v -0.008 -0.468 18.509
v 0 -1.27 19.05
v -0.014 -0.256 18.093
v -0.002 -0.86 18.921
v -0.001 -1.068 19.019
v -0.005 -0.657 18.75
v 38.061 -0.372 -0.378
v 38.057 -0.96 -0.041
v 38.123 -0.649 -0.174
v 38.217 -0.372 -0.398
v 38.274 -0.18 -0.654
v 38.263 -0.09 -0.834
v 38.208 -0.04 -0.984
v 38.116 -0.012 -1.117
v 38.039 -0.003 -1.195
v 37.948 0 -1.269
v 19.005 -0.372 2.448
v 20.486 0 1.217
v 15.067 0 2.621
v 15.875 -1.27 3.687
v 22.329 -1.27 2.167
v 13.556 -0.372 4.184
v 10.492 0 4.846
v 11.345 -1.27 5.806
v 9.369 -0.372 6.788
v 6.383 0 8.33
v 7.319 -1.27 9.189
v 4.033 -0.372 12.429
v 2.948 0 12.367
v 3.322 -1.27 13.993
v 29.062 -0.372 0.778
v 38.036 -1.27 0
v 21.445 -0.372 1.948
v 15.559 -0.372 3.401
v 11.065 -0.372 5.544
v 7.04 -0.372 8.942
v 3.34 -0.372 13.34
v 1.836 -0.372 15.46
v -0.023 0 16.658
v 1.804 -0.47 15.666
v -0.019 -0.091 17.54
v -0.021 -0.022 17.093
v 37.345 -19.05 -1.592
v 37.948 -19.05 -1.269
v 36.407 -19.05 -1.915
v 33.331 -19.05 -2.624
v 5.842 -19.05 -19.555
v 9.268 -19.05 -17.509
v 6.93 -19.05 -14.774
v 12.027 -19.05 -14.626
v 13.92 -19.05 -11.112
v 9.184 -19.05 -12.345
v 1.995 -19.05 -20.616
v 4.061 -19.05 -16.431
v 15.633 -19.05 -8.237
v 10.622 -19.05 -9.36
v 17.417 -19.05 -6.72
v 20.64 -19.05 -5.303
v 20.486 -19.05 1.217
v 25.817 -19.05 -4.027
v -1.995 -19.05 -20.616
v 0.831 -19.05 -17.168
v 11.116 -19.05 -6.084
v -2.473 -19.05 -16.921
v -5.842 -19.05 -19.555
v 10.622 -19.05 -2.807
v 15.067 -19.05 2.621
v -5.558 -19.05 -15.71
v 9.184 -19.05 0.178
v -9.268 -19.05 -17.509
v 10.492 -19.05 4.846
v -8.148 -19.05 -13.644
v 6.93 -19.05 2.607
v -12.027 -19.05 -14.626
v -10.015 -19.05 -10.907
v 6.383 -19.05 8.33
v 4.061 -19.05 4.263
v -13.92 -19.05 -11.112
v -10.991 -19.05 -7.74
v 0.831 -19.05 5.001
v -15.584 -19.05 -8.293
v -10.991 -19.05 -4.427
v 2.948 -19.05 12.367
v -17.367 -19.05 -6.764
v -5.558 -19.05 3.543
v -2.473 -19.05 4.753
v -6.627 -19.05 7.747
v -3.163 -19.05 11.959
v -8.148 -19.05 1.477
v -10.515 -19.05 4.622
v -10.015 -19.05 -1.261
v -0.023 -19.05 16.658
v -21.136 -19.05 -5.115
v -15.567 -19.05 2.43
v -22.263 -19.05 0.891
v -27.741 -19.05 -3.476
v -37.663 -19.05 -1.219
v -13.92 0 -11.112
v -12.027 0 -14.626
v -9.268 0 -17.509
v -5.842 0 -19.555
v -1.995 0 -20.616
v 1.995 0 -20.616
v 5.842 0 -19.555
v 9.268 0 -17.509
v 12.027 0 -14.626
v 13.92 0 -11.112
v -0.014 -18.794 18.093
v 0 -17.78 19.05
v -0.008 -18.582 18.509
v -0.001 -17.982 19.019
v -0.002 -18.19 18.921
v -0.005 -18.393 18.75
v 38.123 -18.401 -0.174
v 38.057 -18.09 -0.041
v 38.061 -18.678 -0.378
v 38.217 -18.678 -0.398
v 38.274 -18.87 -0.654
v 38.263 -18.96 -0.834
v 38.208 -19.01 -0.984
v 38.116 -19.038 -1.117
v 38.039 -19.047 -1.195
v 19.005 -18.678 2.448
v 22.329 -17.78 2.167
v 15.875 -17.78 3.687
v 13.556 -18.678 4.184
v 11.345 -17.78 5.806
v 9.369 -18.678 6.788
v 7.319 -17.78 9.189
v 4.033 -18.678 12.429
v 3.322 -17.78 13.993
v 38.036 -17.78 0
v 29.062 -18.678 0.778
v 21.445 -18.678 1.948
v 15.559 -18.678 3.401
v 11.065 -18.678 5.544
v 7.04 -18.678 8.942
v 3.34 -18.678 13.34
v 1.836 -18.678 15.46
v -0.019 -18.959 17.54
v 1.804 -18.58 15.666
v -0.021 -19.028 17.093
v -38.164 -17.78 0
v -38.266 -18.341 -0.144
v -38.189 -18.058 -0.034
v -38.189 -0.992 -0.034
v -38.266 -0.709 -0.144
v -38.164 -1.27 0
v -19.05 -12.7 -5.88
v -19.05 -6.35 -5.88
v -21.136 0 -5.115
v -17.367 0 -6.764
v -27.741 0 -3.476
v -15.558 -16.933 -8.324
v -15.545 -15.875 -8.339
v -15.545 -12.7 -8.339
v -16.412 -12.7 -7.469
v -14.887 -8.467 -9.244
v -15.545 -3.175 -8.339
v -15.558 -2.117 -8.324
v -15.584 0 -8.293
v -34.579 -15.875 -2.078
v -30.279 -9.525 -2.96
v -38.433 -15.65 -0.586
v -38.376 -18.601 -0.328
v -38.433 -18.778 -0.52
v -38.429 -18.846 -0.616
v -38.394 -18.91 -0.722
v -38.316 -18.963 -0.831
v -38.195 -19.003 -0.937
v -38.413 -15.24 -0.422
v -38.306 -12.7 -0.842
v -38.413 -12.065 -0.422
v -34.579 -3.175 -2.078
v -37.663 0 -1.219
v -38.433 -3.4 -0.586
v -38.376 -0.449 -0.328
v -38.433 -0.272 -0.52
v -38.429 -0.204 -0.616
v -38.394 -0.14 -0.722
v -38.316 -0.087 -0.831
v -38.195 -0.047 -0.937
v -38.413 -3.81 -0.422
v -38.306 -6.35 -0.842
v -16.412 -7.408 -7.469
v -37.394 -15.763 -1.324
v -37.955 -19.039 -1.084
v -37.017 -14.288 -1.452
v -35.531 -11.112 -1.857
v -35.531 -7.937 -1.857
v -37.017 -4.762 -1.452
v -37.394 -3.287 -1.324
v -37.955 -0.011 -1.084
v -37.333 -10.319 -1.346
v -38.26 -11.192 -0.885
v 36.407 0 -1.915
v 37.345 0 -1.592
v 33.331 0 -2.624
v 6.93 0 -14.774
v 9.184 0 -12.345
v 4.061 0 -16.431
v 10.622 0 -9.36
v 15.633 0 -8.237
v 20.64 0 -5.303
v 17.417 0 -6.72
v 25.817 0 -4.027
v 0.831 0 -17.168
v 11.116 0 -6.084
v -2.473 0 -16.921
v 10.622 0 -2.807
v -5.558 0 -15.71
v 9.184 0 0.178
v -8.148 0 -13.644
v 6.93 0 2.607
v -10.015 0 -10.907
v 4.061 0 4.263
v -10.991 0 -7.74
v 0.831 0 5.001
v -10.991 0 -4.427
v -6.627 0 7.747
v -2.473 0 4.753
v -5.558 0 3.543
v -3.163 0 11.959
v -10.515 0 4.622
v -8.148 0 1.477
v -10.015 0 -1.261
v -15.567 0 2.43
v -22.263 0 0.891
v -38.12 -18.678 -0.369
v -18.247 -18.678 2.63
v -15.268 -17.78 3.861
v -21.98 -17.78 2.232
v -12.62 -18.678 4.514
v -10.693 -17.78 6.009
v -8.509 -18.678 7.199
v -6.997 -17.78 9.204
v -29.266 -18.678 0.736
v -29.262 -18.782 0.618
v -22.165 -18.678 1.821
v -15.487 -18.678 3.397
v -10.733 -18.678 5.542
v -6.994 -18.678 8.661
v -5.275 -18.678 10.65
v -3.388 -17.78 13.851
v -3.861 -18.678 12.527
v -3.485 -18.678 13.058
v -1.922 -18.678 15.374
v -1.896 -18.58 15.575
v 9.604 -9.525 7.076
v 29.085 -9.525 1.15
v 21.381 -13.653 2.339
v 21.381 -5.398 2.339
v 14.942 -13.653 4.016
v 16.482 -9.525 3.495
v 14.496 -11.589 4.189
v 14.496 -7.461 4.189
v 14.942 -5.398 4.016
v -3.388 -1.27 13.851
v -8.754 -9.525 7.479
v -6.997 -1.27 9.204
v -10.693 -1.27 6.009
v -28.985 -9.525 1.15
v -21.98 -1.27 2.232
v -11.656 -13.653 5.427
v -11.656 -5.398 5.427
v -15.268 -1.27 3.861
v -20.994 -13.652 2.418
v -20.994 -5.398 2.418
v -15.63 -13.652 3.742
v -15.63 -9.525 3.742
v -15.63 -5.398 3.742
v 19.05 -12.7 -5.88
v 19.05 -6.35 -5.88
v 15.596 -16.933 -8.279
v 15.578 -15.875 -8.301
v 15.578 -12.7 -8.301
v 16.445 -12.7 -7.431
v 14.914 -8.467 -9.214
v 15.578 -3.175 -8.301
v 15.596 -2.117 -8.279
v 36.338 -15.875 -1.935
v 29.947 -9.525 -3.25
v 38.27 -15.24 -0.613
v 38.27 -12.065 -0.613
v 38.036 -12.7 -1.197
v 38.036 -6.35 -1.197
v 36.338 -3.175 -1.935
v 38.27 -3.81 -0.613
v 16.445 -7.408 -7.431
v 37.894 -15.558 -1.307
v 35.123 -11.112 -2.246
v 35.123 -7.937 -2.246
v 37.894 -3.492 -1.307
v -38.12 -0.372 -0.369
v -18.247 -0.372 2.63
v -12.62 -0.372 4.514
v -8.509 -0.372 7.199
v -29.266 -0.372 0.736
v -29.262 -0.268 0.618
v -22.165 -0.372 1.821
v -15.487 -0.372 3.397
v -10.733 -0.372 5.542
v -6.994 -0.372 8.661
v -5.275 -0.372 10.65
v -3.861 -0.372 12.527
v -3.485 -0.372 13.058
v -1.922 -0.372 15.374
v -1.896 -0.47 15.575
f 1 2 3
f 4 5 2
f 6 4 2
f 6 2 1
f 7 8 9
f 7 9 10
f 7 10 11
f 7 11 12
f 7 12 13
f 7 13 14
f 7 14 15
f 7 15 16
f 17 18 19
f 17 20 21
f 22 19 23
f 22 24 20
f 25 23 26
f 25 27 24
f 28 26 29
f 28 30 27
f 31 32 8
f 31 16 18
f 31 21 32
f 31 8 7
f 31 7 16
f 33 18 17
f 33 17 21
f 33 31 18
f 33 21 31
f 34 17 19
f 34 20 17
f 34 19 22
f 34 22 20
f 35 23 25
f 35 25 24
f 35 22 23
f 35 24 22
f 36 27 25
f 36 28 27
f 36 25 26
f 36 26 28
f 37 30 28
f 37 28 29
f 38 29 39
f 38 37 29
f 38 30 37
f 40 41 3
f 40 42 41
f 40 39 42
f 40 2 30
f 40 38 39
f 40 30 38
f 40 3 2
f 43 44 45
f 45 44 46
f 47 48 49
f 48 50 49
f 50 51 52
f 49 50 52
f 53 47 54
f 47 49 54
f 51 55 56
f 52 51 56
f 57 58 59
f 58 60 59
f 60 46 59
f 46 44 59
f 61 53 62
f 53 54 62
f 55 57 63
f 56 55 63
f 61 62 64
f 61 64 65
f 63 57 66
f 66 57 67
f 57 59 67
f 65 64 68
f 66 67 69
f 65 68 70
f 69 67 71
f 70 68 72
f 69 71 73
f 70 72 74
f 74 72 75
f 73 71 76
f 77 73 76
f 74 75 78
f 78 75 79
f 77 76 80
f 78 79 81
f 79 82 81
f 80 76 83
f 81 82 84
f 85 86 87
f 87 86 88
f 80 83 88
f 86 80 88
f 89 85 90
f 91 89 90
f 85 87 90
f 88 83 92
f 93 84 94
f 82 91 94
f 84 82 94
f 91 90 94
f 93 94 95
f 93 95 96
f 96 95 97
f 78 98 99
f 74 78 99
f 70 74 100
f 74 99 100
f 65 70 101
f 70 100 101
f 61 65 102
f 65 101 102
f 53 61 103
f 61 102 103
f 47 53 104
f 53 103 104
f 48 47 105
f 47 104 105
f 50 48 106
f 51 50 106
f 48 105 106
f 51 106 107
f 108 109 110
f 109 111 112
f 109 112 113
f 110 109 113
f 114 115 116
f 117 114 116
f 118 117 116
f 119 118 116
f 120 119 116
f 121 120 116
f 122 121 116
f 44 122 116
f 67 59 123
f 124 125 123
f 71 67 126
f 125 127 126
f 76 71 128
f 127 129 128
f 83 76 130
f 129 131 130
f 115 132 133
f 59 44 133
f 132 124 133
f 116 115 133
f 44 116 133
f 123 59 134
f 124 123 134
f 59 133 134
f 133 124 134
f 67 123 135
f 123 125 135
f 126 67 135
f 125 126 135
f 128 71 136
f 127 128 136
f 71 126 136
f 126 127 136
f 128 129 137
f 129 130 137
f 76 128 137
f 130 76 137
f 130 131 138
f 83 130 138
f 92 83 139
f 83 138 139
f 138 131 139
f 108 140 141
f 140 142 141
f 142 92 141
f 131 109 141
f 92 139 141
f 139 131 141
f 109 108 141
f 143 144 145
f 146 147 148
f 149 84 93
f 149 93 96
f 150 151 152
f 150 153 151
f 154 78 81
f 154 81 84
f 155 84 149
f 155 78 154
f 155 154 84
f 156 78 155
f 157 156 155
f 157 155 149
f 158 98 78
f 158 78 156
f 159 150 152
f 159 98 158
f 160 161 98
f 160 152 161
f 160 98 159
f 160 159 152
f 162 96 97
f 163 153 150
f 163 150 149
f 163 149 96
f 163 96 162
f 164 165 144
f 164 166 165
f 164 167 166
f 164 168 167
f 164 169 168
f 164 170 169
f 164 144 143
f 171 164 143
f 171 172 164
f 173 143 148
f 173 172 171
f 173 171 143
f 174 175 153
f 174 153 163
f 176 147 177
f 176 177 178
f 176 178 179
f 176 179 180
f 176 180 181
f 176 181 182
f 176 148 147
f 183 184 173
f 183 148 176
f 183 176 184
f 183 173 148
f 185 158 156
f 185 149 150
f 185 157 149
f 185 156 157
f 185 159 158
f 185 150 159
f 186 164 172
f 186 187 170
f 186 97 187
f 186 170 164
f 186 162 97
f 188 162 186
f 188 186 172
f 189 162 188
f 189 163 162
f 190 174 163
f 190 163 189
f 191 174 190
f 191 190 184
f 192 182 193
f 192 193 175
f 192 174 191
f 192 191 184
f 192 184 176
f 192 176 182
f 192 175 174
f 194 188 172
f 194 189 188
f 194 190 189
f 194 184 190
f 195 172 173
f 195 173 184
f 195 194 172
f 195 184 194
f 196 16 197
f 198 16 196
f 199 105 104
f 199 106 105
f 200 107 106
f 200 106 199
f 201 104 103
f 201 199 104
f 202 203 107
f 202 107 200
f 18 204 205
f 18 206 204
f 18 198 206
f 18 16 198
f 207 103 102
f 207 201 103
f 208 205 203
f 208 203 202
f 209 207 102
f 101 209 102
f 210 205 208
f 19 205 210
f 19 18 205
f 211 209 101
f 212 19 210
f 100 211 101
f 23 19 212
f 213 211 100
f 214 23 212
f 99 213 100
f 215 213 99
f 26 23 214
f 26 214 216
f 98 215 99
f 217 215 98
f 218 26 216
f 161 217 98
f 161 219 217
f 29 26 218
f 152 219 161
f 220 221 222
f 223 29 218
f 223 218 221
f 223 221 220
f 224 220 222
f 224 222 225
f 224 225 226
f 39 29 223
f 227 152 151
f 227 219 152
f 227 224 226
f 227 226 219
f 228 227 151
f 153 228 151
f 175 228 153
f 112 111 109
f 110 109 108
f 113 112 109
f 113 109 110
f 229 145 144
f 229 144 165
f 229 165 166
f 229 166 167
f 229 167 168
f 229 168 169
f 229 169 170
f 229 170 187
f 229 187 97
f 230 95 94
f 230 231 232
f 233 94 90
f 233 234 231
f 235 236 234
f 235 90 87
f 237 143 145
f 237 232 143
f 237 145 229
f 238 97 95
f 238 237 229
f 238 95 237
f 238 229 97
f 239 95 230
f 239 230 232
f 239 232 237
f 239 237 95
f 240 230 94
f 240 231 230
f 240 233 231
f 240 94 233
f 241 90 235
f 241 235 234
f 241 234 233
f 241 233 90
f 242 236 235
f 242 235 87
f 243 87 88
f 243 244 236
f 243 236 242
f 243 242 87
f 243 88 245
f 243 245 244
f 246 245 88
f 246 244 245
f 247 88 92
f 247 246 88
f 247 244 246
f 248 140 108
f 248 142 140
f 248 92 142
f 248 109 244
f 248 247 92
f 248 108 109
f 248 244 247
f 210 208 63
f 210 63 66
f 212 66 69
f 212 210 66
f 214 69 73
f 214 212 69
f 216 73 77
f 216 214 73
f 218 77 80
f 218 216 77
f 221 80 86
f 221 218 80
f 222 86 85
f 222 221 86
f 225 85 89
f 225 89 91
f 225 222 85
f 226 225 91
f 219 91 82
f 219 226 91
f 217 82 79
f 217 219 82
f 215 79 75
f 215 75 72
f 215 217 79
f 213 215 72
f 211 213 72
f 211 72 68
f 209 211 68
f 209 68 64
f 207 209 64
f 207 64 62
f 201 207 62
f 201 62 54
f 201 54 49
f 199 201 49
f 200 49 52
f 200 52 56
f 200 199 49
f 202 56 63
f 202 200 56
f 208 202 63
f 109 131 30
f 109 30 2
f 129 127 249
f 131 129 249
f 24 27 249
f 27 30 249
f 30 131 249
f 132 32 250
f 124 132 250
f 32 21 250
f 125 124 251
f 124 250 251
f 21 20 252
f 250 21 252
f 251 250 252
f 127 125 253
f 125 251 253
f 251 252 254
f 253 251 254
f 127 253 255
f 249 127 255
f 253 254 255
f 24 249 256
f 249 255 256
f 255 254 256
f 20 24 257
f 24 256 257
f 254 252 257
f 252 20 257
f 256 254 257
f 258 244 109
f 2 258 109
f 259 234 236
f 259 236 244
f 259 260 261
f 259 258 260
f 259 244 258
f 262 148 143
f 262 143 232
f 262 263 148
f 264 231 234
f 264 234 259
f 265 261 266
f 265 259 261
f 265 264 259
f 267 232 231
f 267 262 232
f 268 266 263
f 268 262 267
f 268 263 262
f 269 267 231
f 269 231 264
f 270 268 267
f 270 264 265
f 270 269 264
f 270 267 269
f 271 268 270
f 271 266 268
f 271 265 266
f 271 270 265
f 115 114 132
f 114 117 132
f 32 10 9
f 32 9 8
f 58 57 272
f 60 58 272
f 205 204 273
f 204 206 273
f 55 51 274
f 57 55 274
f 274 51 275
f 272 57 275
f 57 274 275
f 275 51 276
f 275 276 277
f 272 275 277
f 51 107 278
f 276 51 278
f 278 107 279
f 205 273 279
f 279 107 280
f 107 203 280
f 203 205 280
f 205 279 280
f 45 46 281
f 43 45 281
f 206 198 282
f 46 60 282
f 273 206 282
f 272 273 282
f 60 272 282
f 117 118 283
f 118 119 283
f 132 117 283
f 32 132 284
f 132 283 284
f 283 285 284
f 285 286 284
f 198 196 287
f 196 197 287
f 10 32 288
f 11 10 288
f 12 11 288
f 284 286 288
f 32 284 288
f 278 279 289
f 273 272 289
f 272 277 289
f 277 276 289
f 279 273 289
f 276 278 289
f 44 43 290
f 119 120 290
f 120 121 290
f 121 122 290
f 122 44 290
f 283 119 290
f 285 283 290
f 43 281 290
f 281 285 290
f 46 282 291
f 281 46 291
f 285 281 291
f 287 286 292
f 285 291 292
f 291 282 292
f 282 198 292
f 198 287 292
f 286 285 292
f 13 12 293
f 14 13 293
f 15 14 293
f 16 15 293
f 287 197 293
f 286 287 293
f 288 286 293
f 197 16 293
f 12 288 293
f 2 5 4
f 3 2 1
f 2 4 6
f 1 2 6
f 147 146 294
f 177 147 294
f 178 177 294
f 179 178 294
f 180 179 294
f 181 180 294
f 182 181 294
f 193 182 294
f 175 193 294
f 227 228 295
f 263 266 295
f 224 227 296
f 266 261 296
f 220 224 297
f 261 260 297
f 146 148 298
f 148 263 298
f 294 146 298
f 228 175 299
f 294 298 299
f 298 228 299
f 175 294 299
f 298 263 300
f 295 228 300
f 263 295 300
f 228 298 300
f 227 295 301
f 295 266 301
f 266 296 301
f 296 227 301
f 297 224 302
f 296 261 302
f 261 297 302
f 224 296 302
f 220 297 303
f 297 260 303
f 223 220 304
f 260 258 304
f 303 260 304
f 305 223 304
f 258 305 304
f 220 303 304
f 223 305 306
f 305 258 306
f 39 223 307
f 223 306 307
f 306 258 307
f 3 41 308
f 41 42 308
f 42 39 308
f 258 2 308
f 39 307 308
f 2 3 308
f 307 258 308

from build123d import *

# Parameters (mm, degrees)
F0_R     = 11.1155463884
F1_DEPTH = 19.05
F2_R     = 1.27


with BuildPart() as f1:
    # F0 (on Front) → F1 (new body)
    with BuildSketch(Plane.XZ):
        with BuildLine():
            add(Edge.make_bspline(
                [(-38.1638994336, 0), (-19.6957219024, 2.1979471251), (-9.311880126, 4.0390839853), (-2.7506002225, 14.761891216), (0, 19.05)],
                knots=[0, 0, 0, 0, 0.5912055263, 1, 1, 1, 1], degree=3))
            add(Edge.make_bspline(
                [(-13.9198412699, -11.1125), (-14.794313883, -9.2288451722), (-17.1100002201, -4.2407487086), (-39.5685055328, -1.9231498725), (-38.3696140076, -0.2816590053), (-38.1638994336, 0)],
                knots=[0, 0, 0, 0, 0.3345084593, 0.8858100955, 1, 1, 1, 1], degree=3))
            ThreePointArc((-13.9198412699, -11.1125), (0, -20.7508764), (13.9198412699, -11.1125))
            add(Edge.make_bspline(
                [(13.9198412699, -11.1125), (14.8240544816, -9.1946143672), (17.2053802942, -4.1436921907), (39.2933100068, -2.4877446669), (38.244207933, -0.4117993191), (38.0361005664, 0)],
                knots=[0, 0, 0, 0, 0.3291827069, 0.8669318993, 1, 1, 1, 1], degree=3))
            add(Edge.make_bspline(
                [(38.0361005664, 0), (20.2584086937, 2.241044324), (10.7040125651, 3.3870131368), (2.4307208404, 14.9494804331), (0, 19.05)],
                knots=[0, 0, 0, 0, 0.5801098598, 1, 1, 1, 1], degree=3))
        make_face()
        with Locations((0, -6.0836733319)):
            Circle(F0_R, mode=Mode.SUBTRACT)
    extrude(amount=F1_DEPTH)

    # F2
    f2_edges = [f1.edges().sort_by_distance(p)[0] for p in [
        (15.828231, -19.05, 3.702963),
        (15.828231, 0, 3.702963),
        (-15.834222, -19.05, 3.677027),
        (-15.834222, 0, 3.677027),
    ]]
    fillet(f2_edges, radius=F2_R)


solid = f1.part
